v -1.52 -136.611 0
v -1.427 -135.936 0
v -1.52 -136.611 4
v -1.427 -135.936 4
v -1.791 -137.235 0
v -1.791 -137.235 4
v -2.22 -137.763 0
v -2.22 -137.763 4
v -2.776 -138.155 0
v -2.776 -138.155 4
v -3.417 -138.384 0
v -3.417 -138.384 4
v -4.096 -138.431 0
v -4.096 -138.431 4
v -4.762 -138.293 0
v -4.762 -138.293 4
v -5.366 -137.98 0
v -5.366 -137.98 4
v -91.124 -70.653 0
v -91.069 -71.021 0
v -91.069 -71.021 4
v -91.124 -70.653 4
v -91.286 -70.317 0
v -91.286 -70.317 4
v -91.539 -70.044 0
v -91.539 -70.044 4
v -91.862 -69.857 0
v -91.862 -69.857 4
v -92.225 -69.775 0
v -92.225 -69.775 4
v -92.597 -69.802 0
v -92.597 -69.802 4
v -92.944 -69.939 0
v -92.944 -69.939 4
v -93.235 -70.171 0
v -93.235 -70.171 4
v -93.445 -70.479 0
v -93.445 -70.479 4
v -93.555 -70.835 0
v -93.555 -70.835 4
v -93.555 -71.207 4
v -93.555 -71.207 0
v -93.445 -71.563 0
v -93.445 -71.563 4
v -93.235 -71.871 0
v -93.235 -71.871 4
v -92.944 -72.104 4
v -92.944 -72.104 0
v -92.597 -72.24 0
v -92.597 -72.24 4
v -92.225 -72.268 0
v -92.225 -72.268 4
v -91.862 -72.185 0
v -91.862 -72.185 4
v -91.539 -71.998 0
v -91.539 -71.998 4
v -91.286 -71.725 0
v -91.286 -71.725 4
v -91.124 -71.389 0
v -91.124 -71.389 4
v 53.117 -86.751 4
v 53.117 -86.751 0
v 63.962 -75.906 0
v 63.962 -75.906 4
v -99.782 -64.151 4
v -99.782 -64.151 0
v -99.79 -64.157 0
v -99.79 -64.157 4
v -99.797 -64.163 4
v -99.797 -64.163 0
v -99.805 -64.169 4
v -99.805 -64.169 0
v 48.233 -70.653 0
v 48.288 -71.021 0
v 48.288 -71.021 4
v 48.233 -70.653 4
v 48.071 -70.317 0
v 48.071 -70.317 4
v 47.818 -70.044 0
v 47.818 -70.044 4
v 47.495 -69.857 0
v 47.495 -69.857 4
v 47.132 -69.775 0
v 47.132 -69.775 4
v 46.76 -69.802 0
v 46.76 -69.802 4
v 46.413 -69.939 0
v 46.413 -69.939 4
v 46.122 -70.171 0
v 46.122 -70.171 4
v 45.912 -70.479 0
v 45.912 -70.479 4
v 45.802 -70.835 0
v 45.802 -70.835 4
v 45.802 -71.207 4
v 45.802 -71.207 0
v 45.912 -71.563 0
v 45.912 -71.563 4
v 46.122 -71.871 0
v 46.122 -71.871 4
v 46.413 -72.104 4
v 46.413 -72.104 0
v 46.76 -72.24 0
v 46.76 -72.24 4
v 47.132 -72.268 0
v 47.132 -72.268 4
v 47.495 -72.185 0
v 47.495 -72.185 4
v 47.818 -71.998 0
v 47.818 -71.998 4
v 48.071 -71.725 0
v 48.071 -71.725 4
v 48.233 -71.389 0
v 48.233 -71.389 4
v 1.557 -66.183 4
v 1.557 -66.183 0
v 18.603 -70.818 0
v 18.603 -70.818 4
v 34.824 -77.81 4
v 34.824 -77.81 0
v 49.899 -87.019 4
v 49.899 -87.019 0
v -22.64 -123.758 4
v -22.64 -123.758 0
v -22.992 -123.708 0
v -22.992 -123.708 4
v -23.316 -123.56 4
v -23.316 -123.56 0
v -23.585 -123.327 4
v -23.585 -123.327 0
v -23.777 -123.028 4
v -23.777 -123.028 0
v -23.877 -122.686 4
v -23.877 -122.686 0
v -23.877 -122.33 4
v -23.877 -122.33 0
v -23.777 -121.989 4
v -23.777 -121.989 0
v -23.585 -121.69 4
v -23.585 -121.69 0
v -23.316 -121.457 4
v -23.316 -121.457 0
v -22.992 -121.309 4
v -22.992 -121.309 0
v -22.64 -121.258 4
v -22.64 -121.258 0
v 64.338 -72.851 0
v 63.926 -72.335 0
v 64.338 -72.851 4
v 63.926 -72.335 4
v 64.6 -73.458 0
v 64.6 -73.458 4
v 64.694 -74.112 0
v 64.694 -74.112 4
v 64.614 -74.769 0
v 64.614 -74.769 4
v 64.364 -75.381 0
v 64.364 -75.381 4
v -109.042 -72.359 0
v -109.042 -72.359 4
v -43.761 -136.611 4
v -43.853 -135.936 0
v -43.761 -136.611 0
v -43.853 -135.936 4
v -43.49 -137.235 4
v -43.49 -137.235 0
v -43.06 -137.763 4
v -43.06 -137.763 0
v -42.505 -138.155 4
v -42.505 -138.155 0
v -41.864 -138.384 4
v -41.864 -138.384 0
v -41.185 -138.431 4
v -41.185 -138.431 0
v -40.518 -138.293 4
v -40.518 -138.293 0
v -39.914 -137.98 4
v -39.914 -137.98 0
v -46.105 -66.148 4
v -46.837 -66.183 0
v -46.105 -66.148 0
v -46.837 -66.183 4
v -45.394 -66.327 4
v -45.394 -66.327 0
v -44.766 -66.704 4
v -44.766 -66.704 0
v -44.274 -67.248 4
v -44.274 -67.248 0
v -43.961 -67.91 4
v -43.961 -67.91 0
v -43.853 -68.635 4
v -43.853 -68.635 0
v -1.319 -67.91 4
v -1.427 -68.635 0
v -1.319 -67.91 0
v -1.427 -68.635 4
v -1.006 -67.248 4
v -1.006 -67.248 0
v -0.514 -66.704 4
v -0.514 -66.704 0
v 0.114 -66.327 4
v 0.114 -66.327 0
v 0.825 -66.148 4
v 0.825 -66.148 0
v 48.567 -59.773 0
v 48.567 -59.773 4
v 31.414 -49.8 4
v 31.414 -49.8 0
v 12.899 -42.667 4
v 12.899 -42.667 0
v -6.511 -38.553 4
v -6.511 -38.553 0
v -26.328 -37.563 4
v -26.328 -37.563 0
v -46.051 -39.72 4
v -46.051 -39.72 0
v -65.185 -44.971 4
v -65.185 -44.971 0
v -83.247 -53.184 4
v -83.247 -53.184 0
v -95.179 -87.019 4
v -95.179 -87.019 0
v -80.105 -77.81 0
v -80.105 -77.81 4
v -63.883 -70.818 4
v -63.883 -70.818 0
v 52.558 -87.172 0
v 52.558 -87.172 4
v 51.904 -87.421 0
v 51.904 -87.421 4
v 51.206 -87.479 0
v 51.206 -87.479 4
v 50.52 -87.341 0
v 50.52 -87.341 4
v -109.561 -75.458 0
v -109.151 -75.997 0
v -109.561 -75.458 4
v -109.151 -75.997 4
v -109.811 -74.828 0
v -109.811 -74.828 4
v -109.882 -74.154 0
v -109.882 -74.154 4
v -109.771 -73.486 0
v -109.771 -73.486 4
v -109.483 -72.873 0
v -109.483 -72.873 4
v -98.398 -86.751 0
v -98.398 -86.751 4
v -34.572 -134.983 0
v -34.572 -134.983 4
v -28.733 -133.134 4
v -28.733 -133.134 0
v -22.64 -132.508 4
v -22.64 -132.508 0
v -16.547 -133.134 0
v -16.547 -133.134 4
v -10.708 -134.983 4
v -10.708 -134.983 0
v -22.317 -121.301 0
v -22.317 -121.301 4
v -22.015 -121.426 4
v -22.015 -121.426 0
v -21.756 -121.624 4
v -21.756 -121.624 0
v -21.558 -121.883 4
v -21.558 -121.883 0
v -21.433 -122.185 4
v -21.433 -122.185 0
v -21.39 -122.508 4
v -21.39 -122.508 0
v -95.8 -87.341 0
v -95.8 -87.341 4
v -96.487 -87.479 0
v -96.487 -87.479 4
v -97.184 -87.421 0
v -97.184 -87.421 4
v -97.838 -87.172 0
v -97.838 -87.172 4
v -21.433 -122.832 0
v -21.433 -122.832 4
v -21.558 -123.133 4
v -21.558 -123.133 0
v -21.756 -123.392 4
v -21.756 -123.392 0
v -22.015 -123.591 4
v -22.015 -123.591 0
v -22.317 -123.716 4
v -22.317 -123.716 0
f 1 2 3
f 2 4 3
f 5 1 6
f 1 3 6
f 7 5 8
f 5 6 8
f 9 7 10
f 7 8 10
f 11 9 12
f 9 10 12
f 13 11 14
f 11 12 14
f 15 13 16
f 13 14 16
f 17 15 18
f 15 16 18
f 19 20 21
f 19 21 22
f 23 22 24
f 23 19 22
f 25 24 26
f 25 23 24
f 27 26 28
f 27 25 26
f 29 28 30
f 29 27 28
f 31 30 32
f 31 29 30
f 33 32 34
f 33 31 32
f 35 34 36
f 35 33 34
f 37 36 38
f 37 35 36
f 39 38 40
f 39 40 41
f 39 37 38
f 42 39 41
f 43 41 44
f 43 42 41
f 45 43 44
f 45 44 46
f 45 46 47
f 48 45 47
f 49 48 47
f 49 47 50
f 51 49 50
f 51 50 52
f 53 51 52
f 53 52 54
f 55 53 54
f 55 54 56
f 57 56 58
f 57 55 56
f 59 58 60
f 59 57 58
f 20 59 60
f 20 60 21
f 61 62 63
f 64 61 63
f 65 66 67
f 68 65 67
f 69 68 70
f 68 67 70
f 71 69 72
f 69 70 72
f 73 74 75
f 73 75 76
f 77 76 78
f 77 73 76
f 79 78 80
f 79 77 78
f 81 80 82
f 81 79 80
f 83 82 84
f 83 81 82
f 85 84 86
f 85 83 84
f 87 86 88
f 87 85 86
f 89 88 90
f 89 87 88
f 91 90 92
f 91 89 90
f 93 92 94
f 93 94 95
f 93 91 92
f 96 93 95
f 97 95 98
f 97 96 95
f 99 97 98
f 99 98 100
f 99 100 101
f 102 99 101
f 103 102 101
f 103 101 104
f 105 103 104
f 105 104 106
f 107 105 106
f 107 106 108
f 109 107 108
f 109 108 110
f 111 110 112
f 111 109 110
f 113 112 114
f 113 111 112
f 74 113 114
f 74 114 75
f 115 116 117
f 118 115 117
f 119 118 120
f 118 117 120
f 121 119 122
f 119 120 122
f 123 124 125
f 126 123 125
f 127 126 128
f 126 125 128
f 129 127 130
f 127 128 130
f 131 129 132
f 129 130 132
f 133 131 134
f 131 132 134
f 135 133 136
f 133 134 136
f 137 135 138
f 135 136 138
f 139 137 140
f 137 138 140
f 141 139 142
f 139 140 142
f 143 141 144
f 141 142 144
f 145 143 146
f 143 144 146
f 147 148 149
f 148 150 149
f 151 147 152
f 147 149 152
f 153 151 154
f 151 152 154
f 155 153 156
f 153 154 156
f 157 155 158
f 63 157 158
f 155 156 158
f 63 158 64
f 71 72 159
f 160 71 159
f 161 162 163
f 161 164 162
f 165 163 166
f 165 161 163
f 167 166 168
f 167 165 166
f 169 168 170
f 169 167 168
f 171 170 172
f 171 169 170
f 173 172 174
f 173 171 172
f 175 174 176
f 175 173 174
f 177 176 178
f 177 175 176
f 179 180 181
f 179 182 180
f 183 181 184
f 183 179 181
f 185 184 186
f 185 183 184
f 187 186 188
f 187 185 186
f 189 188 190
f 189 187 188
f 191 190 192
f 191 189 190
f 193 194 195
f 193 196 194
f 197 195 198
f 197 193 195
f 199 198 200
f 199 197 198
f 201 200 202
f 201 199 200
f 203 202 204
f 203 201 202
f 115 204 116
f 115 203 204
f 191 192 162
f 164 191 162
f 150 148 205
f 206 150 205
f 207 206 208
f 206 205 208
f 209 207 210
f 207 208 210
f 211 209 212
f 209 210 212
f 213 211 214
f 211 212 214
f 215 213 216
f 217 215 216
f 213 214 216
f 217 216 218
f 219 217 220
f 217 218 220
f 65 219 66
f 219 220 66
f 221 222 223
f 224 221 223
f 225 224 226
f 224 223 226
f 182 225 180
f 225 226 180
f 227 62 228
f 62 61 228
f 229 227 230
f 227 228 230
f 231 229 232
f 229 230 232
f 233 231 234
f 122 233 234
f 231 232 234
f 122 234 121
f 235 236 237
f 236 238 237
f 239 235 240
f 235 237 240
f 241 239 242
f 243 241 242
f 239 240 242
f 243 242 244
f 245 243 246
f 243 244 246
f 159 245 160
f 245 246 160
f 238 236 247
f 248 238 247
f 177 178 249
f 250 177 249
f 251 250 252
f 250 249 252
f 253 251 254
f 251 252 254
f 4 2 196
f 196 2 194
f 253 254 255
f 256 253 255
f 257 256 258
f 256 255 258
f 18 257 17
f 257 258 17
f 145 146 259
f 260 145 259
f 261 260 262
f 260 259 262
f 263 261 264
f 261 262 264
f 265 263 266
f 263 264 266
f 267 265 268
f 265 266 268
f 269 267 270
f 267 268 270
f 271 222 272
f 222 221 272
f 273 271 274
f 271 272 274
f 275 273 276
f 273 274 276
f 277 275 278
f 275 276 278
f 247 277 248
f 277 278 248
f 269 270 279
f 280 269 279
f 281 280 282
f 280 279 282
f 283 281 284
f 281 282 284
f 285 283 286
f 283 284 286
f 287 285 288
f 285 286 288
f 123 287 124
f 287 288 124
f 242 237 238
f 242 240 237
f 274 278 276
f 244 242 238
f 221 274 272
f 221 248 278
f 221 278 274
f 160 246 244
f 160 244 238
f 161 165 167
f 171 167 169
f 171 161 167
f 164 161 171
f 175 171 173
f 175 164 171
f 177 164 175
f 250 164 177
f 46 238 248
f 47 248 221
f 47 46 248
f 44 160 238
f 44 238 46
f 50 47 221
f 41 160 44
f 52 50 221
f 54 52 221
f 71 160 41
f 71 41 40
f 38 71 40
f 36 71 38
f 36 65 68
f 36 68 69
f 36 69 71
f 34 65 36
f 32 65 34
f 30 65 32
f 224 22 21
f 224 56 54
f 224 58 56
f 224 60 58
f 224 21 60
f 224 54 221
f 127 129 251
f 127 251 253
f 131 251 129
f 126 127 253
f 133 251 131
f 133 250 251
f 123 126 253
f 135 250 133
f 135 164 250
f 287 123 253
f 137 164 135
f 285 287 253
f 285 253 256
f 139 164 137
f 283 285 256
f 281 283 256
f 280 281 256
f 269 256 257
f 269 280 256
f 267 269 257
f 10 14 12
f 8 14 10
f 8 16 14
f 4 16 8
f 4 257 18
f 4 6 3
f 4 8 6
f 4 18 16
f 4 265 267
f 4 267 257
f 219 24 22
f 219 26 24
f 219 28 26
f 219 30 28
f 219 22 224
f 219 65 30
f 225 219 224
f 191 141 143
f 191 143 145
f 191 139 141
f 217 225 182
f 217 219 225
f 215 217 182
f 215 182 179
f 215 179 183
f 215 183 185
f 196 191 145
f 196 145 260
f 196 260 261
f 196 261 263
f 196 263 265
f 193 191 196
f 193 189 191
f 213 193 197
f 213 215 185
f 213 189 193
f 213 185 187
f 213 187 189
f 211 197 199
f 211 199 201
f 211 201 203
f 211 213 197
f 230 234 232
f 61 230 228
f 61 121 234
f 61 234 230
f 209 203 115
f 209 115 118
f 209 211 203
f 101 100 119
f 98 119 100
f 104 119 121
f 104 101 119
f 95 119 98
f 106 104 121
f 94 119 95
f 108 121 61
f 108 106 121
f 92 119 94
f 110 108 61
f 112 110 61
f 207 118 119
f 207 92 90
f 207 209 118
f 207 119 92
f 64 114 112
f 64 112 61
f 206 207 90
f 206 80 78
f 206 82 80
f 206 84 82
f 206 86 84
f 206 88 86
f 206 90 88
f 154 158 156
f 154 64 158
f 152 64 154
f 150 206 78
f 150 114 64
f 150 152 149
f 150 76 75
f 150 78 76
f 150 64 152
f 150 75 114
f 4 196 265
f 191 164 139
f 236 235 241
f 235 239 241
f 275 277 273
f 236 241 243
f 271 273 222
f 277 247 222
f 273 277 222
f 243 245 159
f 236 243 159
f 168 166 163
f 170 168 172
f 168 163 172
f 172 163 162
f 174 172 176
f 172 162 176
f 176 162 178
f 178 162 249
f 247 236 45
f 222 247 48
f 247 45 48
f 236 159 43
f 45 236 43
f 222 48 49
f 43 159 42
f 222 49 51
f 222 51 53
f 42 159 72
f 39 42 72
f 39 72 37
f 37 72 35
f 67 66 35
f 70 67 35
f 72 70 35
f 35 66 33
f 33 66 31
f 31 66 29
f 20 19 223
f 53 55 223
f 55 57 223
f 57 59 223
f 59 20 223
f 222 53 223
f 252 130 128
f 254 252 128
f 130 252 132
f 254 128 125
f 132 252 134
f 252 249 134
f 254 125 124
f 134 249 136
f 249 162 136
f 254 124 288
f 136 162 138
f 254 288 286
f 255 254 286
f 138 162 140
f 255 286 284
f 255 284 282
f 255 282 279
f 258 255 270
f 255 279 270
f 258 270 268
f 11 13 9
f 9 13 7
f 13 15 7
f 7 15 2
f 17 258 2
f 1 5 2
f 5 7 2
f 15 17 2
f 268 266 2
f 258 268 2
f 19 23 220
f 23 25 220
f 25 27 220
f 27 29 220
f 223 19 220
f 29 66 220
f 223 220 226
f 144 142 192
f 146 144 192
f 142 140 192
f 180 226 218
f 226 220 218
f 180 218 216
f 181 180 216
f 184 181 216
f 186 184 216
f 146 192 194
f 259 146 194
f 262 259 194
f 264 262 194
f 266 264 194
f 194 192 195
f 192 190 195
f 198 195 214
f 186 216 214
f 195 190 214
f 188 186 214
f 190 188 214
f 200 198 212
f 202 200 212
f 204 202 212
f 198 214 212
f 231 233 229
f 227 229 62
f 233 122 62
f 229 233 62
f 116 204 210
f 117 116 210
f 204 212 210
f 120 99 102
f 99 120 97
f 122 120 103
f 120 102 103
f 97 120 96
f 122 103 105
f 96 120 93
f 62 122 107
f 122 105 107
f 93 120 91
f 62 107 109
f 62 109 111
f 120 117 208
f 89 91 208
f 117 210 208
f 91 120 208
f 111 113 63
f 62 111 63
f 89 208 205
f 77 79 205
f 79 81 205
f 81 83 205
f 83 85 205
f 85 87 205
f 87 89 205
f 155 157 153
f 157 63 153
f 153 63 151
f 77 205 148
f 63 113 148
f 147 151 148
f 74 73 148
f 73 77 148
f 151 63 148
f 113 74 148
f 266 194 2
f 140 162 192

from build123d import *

# Parameters (mm, degrees)
SKETCH1_R           = 1.25
BOSS_EXTRUDE1_DEPTH = 4
FILLET1_R           = 2.5
FILLET2_R           = 2.5
FILLET3_R           = 2.5
FILLET4_R           = 2.5
FILLET5_R           = 2.5


with BuildPart() as part:
    # Sketch1 → Boss-Extrude1 (new body)
    with BuildSketch(Plane.XY):
        with BuildLine():
            Line((-99.804604555, -64.168856805), (-111.028493279, -74.119953323))
            Line((-111.028493279, -74.119953323), (-101.028493279, -84.119953323))
            Line((-101.028493279, -84.119953323), (-96.889069885, -88.259376717))
            ThreePointArc((-96.889069885, -88.259376717), (-71.693791888, -73.845522502), (-43.853349067, -65.631451023))
            Line((-43.853349067, -65.631451023), (-43.853349067, -141.295097535))
            ThreePointArc((-43.853349067, -141.295097535), (-34.120648602, -134.791914996), (-22.640145631, -132.508300971))
            ThreePointArc((-22.640145631, -132.508300971), (-11.15964266, -134.791914996), (-1.426942195, -141.295097535))
            Line((-1.426942195, -141.295097535), (-1.426942195, -65.631451023))
            ThreePointArc((-1.426942195, -65.631451023), (26.413500625, -73.845522502), (51.608778623, -88.259376717))
            Line((51.608778623, -88.259376717), (65.748202017, -74.119953323))
            ThreePointArc((65.748202017, -74.119953323), (25.195283415, -47.023359407), (-22.640145631, -37.508300971))
            ThreePointArc((-22.640145631, -37.508300971), (-63.44684459, -44.356647068), (-99.782209189, -64.15128785))
            ThreePointArc((-99.782209189, -64.15128785), (-99.793407372, -64.16007169), (-99.804604555, -64.168856805))
        make_face()
        with BuildLine():
            ThreePointArc((-21.390145631, -122.508300971), (-21.756262155, -123.392184447), (-22.640145631, -123.758300971))
            ThreePointArc((-22.640145631, -123.758300971), (-23.890145631, -122.508300971), (-22.640145631, -121.258300971))
            ThreePointArc((-22.640145631, -121.258300971), (-21.756262155, -121.624417494), (-21.390145631, -122.508300971))
        make_face(mode=Mode.SUBTRACT)
        with Locations((-92.318549214, -71.021033692)):
            Circle(SKETCH1_R, mode=Mode.SUBTRACT)
        with Locations((47.038257951, -71.021033692)):
            Circle(SKETCH1_R, mode=Mode.SUBTRACT)
    extrude(amount=BOSS_EXTRUDE1_DEPTH)

    # Fillet1
    fillet1_edges = [part.edges().sort_by_distance(p)[0] for p in [
        (65.748202017, -74.119953323, 2),
        (51.608778623, -88.259376717, 2),
    ]]
    fillet(fillet1_edges, radius=FILLET1_R)

    # Fillet2
    fillet2_edges = [part.edges().sort_by_distance(p)[0] for p in [
        (-1.426942195, -141.295097535, 2),
        (-43.853349067, -141.295097535, 2),
    ]]
    fillet(fillet2_edges, radius=FILLET2_R)

    # Fillet3
    fillet3_edges = [part.edges().sort_by_distance(p)[0] for p in [
        (-96.889069885, -88.259376717, 2),
        (-111.028493279, -74.119953323, 2),
    ]]
    fillet(fillet3_edges, radius=FILLET3_R)

    # Fillet4
    fillet4_edges = [part.edges().sort_by_distance(p)[0] for p in [
        (-43.853349067, -65.631451023, 2),
    ]]
    fillet(fillet4_edges, radius=FILLET4_R)

    # Fillet5
    fillet5_edges = [part.edges().sort_by_distance(p)[0] for p in [
        (-1.426942195, -65.631451023, 2),
    ]]
    fillet(fillet5_edges, radius=FILLET5_R)


solid = part.part
